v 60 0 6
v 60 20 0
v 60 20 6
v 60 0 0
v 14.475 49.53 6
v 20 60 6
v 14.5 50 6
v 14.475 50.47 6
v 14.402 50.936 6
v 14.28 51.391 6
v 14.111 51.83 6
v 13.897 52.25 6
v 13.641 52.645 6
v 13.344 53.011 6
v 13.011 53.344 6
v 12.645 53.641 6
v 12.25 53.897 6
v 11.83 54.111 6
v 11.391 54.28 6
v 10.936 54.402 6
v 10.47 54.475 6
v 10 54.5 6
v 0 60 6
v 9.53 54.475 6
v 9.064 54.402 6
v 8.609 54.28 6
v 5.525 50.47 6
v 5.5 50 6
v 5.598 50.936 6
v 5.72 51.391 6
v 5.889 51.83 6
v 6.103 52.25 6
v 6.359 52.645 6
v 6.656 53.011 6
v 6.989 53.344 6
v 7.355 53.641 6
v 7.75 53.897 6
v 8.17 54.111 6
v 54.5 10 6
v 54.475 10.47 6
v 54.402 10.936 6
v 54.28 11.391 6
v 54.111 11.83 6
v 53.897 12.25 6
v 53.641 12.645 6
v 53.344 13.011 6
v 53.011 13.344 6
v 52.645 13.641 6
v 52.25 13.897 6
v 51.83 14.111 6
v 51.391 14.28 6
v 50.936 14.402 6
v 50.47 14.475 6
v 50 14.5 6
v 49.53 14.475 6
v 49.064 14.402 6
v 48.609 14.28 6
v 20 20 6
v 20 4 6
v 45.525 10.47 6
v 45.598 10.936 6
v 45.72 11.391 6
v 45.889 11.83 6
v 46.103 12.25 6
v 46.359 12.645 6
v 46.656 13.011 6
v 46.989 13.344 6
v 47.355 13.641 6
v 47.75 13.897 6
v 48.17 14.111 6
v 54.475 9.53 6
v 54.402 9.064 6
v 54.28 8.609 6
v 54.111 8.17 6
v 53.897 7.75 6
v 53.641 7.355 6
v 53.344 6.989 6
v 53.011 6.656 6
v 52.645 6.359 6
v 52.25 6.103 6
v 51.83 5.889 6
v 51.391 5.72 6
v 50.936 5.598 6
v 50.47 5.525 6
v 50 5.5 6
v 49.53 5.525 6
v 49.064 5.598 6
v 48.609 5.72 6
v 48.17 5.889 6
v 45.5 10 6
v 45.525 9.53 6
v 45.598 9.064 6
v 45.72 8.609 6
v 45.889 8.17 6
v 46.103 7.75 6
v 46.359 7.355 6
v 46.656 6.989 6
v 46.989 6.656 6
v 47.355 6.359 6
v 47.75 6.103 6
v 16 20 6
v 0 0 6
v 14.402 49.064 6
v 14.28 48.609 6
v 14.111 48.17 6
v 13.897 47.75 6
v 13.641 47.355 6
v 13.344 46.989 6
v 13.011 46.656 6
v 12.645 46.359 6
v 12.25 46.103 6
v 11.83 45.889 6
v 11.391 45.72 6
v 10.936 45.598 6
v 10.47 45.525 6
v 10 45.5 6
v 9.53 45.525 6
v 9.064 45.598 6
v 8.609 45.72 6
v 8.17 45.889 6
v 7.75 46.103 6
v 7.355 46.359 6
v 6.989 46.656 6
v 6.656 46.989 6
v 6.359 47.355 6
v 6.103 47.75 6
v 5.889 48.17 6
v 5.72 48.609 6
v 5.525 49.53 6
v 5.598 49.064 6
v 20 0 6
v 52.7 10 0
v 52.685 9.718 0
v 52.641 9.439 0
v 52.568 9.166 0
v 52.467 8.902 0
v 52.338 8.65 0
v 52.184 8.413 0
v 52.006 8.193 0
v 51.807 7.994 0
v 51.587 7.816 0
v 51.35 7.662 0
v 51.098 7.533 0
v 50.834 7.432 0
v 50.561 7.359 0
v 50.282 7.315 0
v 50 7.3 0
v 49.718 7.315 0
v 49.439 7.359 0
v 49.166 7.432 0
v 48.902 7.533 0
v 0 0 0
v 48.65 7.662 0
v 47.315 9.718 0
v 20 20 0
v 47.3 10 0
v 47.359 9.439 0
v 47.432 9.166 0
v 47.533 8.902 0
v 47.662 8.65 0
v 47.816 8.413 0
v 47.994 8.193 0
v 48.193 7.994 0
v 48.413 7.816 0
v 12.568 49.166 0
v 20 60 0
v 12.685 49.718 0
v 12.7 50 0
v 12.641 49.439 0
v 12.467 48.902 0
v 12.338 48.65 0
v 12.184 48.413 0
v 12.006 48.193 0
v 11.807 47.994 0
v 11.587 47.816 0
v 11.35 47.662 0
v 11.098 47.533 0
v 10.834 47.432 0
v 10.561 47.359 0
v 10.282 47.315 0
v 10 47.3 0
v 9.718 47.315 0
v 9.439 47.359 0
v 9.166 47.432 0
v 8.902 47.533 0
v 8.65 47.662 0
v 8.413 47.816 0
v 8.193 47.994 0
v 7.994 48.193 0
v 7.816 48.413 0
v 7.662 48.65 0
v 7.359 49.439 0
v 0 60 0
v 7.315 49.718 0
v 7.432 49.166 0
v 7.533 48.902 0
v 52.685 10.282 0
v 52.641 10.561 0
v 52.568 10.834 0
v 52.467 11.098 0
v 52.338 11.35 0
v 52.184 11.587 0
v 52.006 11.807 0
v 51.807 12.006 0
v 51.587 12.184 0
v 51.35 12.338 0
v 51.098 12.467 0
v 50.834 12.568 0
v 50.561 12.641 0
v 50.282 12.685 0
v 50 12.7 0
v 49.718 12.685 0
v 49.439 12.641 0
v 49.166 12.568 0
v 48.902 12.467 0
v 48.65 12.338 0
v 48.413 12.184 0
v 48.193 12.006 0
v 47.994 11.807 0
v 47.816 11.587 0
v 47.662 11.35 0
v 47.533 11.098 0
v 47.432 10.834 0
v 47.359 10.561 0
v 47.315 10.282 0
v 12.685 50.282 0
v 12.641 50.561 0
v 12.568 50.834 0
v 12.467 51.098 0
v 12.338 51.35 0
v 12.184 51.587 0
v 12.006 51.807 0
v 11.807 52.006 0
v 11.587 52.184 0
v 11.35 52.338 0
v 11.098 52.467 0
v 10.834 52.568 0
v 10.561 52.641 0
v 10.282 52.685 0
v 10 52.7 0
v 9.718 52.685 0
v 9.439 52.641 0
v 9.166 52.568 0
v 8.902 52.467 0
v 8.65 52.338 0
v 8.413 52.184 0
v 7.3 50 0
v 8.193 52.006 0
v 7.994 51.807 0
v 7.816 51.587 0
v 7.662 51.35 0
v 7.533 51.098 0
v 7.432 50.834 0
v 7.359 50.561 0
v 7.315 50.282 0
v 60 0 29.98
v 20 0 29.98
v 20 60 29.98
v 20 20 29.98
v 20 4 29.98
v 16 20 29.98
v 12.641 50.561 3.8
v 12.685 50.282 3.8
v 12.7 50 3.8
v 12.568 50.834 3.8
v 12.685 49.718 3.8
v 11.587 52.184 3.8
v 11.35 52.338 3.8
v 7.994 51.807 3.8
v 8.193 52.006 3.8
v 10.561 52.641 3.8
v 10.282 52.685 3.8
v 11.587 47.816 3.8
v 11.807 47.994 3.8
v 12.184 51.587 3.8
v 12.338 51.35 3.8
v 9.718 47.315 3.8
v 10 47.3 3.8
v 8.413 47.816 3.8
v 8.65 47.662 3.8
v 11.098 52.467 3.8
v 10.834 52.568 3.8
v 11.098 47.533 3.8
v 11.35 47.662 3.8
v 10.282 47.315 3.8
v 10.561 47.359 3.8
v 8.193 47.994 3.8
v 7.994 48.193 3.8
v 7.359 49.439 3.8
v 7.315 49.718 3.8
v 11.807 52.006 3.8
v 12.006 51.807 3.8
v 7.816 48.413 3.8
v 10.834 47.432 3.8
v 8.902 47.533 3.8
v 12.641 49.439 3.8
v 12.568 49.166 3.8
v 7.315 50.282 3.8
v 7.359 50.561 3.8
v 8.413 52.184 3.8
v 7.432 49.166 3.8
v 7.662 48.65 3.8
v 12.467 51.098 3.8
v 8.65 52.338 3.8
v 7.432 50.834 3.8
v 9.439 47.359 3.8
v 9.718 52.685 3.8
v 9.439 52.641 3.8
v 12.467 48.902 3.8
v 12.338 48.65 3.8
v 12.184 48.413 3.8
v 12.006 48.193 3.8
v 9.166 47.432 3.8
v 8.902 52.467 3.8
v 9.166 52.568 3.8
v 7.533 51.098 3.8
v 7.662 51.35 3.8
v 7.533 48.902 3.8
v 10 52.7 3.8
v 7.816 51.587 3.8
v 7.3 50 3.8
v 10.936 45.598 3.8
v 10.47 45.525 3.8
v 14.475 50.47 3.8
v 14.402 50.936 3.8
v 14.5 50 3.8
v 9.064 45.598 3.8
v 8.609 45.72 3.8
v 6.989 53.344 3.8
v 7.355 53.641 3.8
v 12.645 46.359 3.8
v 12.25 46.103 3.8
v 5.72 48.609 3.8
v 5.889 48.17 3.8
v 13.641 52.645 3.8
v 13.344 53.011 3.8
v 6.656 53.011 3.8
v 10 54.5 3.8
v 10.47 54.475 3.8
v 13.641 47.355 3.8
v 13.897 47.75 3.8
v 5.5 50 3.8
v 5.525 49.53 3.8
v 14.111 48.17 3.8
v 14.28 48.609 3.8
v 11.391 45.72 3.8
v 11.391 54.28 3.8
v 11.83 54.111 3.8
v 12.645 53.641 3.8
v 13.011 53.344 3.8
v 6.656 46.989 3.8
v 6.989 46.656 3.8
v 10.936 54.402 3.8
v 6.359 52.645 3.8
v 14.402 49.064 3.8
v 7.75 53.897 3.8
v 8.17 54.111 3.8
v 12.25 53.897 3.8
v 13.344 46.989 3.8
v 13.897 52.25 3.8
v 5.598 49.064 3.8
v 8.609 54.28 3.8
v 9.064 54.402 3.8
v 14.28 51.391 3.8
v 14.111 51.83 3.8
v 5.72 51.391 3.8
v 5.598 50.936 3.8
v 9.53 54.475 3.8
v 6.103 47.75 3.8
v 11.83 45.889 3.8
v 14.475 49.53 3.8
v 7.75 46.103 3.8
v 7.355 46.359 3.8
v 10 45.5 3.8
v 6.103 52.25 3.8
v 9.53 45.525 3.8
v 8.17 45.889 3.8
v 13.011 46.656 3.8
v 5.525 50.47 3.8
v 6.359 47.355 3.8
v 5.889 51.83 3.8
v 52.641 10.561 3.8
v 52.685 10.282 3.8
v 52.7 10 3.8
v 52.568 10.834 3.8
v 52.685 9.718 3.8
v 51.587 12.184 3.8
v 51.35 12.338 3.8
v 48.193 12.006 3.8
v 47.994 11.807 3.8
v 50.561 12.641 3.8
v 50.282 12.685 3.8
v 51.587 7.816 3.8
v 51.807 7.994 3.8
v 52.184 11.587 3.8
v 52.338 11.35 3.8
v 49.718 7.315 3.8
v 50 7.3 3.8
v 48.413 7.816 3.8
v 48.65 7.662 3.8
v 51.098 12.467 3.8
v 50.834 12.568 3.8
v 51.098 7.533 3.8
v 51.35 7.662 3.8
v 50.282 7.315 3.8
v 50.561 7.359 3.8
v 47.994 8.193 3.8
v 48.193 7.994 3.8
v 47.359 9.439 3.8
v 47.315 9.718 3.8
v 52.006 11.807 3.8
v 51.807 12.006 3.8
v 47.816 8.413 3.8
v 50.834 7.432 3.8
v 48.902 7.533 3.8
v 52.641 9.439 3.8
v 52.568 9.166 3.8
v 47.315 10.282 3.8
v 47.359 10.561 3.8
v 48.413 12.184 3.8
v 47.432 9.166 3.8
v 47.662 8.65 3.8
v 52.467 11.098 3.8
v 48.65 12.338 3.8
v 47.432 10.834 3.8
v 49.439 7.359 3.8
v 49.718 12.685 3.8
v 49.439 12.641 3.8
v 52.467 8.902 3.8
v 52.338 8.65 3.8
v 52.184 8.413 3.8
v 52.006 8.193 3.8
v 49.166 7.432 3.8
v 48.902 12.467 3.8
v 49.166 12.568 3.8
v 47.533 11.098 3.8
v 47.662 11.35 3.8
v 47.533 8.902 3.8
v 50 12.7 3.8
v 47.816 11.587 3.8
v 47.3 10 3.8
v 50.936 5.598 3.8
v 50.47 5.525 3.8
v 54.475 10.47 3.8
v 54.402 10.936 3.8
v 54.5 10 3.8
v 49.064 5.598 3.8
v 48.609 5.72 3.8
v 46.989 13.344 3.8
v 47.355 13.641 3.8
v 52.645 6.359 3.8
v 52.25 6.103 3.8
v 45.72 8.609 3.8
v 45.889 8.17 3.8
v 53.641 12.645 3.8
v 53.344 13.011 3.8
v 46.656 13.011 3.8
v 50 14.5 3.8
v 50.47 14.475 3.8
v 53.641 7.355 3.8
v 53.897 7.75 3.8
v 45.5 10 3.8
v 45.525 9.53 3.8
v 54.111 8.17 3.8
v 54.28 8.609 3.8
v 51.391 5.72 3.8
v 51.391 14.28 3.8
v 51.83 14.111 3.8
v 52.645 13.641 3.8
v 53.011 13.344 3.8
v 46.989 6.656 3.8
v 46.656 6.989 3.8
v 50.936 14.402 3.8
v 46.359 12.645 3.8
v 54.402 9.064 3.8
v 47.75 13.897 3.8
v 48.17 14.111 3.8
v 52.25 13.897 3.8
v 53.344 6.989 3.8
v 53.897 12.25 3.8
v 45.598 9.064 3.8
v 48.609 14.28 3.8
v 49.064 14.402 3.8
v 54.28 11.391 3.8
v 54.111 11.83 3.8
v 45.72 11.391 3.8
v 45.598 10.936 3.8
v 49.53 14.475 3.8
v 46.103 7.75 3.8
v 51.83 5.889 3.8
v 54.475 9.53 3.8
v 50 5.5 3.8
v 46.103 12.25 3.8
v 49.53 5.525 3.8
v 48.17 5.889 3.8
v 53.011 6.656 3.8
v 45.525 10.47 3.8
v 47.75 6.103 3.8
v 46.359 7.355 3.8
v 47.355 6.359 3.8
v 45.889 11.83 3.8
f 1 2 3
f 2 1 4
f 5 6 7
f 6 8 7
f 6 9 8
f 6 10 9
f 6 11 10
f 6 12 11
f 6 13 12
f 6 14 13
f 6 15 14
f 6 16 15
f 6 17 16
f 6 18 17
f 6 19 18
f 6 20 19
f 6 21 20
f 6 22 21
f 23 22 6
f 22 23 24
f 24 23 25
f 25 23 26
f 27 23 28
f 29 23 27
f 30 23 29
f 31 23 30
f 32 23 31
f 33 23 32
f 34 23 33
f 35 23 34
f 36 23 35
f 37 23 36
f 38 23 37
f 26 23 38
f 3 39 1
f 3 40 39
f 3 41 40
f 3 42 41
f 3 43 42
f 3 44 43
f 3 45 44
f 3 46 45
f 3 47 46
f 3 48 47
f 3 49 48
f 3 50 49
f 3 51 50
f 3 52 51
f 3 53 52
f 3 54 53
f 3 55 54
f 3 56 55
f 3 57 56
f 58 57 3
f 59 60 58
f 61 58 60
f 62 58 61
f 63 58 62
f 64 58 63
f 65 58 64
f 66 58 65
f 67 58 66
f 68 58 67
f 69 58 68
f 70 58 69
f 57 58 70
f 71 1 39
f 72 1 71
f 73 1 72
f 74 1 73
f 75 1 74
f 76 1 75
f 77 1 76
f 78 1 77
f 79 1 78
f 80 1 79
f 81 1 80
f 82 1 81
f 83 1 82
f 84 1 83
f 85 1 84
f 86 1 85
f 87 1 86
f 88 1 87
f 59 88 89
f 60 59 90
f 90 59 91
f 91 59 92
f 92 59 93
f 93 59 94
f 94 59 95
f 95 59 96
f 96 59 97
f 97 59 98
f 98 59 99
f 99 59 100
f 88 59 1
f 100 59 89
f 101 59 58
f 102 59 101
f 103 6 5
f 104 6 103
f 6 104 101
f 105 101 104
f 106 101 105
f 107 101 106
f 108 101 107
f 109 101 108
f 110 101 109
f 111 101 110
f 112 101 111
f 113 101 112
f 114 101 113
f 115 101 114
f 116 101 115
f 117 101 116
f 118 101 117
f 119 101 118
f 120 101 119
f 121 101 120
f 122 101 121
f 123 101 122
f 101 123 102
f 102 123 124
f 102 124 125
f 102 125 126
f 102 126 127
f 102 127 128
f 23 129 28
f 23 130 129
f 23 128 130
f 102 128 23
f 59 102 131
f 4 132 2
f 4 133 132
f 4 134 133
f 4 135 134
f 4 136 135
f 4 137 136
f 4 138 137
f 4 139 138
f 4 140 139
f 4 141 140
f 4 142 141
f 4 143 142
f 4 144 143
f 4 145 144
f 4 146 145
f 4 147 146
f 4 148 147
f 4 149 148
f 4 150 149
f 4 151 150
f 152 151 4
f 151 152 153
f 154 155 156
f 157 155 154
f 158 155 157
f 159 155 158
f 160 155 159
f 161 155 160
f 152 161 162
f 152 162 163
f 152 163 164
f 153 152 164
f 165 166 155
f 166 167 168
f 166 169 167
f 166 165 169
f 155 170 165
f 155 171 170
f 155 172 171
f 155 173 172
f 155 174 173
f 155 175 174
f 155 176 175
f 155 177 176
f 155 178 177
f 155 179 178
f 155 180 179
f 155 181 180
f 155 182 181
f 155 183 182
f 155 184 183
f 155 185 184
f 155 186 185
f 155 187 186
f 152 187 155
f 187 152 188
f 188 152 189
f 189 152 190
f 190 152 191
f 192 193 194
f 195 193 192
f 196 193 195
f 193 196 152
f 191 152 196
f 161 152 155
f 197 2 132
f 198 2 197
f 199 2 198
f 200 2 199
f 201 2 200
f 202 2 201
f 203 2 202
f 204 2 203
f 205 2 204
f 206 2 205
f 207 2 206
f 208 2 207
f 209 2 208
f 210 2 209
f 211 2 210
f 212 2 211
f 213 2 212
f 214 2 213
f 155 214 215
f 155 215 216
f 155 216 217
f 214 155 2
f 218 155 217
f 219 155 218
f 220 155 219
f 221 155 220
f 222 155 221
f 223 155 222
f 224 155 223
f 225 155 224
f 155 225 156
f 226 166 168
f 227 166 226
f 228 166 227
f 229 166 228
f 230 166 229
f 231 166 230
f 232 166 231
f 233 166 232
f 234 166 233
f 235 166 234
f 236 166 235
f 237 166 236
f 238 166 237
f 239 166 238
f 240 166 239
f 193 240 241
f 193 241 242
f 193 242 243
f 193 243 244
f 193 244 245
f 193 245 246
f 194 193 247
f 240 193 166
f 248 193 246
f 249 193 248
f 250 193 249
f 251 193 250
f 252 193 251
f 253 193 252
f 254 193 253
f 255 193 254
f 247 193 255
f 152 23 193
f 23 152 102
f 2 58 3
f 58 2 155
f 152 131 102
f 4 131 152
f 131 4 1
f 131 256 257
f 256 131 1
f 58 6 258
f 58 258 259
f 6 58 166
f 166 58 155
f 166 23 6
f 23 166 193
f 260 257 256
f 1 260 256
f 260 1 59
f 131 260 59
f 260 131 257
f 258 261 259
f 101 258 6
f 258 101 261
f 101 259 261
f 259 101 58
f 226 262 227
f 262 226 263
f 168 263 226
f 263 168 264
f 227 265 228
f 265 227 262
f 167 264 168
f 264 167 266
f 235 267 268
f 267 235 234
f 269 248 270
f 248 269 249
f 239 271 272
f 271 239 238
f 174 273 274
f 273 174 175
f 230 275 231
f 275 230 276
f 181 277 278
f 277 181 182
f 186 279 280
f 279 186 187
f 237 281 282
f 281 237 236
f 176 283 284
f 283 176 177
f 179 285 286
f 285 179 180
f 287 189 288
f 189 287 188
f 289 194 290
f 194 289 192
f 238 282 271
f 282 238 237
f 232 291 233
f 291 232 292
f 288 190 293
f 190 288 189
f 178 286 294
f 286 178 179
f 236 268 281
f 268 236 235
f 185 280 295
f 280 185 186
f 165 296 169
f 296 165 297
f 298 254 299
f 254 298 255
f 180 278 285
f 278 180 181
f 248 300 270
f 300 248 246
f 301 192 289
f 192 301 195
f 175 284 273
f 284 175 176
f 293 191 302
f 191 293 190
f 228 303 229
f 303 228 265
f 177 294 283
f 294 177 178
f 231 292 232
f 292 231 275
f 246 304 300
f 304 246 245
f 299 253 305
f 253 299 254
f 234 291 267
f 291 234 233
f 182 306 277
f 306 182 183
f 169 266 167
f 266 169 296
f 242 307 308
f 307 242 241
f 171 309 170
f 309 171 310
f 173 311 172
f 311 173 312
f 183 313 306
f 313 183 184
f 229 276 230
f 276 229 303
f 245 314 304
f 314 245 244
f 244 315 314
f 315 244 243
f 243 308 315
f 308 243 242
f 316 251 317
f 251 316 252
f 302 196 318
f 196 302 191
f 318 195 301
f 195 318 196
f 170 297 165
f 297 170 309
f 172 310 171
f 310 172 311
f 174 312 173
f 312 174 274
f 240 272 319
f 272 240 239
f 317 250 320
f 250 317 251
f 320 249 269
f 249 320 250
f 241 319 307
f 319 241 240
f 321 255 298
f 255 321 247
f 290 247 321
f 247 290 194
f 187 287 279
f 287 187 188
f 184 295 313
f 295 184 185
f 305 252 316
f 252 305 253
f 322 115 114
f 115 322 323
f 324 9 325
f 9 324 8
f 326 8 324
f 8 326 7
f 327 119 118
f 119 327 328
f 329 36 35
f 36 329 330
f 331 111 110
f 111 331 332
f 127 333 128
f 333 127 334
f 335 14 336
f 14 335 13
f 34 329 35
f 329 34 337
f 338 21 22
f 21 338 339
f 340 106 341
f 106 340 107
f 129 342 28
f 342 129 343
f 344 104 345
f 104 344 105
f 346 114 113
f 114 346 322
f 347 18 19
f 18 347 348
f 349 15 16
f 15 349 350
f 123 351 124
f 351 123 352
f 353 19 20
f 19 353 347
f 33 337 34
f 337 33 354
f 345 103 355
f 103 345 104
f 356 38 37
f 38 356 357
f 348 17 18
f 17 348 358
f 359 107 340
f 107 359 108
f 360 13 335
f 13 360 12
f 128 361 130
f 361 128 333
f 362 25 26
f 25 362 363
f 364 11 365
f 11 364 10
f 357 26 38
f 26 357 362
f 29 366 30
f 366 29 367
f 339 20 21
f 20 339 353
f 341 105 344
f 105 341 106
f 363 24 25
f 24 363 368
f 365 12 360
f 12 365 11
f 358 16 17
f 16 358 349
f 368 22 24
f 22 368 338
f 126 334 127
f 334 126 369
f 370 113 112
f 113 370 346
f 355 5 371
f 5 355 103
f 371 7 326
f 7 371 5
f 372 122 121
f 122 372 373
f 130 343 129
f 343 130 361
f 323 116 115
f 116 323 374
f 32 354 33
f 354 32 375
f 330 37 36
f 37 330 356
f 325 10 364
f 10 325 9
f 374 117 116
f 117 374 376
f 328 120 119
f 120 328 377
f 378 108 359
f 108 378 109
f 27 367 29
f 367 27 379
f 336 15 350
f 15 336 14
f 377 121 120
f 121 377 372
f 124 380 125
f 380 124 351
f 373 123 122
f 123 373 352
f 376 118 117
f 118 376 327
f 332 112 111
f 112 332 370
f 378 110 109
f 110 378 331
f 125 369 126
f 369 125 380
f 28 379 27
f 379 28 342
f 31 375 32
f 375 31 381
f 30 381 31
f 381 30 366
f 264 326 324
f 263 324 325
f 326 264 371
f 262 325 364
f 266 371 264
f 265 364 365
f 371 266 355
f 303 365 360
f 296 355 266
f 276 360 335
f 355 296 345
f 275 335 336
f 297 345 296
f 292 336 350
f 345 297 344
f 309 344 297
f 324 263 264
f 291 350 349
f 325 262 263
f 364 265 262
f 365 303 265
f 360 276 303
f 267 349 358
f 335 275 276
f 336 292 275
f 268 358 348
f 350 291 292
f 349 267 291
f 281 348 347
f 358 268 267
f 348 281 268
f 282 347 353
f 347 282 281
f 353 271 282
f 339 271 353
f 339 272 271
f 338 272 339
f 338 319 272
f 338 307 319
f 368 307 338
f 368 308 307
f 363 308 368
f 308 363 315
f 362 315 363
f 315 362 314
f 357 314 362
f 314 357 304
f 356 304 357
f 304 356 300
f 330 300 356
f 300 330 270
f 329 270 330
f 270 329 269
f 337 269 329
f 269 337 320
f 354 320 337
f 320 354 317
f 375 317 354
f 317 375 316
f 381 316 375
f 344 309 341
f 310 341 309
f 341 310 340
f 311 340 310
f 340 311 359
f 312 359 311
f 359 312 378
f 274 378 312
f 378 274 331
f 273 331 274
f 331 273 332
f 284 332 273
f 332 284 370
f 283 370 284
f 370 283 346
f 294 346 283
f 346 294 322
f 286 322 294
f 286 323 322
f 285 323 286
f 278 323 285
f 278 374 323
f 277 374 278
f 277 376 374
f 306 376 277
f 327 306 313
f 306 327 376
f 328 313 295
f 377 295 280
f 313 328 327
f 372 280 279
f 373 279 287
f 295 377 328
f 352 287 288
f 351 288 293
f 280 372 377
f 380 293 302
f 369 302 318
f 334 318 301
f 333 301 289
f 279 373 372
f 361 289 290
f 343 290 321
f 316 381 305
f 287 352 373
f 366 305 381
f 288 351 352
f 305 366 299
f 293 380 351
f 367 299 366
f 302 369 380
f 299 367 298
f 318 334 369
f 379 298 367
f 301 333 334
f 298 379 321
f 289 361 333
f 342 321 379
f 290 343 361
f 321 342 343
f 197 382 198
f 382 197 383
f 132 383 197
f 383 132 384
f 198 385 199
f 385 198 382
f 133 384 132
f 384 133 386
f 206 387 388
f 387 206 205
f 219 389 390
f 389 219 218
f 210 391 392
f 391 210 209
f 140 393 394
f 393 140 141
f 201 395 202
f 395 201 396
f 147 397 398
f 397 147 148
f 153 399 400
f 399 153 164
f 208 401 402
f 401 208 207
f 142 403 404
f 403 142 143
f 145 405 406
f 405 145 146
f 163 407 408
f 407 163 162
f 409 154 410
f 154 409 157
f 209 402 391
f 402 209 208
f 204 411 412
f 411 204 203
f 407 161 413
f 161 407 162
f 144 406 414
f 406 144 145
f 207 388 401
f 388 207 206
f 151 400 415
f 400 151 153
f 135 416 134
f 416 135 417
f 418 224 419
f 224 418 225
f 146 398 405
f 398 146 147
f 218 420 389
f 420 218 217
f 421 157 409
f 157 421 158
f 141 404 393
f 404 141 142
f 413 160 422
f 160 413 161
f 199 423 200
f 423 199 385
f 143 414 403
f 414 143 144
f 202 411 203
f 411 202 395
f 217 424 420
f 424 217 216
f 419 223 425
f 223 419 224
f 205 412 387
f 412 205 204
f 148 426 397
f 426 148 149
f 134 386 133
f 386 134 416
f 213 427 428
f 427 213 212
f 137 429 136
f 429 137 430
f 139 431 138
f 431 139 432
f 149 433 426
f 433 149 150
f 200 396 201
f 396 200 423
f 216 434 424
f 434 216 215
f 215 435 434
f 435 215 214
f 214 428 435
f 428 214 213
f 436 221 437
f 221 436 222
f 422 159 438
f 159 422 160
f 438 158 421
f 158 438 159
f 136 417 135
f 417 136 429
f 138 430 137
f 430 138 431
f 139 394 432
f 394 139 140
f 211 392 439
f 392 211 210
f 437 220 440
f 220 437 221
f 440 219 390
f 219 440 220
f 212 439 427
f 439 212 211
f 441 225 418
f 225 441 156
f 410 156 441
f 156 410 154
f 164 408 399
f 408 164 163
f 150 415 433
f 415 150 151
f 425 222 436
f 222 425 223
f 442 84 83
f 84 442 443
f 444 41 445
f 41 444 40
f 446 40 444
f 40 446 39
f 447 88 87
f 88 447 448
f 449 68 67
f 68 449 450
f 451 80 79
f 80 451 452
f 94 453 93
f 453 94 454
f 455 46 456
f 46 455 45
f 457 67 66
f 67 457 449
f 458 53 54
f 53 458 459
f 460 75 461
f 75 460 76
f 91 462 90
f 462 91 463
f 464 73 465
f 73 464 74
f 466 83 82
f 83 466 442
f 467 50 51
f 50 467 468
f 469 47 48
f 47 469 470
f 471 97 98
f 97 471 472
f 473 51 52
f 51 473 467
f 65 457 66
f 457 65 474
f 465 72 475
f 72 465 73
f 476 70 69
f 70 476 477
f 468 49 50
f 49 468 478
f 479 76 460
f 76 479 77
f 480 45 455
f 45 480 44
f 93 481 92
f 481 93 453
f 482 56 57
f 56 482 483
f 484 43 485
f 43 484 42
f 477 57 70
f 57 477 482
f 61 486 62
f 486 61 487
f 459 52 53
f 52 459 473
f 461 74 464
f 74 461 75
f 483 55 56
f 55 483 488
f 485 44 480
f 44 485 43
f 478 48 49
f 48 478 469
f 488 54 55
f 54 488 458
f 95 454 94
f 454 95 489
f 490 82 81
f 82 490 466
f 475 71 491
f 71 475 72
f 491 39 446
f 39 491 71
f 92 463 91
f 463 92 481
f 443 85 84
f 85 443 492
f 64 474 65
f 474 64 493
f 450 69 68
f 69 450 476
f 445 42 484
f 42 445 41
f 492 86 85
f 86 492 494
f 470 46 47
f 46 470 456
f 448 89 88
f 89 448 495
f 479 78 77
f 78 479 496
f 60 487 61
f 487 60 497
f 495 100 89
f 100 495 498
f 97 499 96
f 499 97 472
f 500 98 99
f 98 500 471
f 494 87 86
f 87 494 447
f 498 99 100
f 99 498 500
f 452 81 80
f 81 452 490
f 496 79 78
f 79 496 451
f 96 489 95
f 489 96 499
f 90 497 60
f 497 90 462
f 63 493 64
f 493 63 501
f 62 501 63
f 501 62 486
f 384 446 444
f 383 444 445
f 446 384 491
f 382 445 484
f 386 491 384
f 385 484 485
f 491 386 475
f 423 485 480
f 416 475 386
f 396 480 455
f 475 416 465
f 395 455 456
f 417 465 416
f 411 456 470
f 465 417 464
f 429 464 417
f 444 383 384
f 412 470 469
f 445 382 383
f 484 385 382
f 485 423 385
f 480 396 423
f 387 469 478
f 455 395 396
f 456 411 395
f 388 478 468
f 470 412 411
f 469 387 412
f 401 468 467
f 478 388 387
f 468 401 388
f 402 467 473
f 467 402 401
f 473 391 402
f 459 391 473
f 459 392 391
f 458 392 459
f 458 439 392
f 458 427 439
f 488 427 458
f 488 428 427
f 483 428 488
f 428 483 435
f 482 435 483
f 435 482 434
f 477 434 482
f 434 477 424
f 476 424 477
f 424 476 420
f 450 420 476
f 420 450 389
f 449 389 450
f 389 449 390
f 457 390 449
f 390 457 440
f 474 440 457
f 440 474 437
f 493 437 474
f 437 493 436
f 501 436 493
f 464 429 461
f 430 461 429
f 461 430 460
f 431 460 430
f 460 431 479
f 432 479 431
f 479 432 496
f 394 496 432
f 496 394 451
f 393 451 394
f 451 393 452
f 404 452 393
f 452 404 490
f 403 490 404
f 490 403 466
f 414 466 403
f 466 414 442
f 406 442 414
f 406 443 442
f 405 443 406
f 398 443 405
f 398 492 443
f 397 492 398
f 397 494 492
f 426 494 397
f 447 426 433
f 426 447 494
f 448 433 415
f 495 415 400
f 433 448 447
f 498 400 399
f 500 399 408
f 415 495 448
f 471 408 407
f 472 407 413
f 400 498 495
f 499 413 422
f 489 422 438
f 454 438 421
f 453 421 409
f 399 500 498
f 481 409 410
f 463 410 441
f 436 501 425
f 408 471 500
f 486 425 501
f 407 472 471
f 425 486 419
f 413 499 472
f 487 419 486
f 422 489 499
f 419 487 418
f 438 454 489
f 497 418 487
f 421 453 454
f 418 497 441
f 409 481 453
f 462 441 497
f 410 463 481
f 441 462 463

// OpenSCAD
// 2020 corner bracket 60 mm
// 2020 aluminium-profile corner with ribs that overlap the L legs by eps.
$fn = 60;
eps = 0.02;
profile = 20;
arm = 60;
plate_t = 6;
rib_t = 4;
rib_h = 24;
hole_d = 5.4;
counterbore_d = 9;
counterbore_h = 2.2;

module rib_x() {
    translate([profile, 0, plate_t - eps])
        linear_extrude(height = rib_h)
            polygon(points = [[0, 0], [arm - profile, 0], [0, rib_t]]);
}

module rib_y() {
    translate([profile, profile, plate_t - eps])
        rotate([0, 0, 90])
            linear_extrude(height = rib_h)
                polygon(points = [[0, 0], [arm - profile, 0], [0, rib_t]]);
}

difference() {
    union() {
        cube([arm, profile, plate_t]);
        cube([profile, arm, plate_t]);
        rib_x();
        rib_y();
    }
    for (p = [[profile / 2, arm - profile / 2], [arm - profile / 2, profile / 2]]) {
        translate([p[0], p[1], -eps]) cylinder(d = hole_d, h = plate_t + 2 * eps);
        translate([p[0], p[1], plate_t - counterbore_h])
            cylinder(d = counterbore_d, h = counterbore_h + eps);
    }
}
